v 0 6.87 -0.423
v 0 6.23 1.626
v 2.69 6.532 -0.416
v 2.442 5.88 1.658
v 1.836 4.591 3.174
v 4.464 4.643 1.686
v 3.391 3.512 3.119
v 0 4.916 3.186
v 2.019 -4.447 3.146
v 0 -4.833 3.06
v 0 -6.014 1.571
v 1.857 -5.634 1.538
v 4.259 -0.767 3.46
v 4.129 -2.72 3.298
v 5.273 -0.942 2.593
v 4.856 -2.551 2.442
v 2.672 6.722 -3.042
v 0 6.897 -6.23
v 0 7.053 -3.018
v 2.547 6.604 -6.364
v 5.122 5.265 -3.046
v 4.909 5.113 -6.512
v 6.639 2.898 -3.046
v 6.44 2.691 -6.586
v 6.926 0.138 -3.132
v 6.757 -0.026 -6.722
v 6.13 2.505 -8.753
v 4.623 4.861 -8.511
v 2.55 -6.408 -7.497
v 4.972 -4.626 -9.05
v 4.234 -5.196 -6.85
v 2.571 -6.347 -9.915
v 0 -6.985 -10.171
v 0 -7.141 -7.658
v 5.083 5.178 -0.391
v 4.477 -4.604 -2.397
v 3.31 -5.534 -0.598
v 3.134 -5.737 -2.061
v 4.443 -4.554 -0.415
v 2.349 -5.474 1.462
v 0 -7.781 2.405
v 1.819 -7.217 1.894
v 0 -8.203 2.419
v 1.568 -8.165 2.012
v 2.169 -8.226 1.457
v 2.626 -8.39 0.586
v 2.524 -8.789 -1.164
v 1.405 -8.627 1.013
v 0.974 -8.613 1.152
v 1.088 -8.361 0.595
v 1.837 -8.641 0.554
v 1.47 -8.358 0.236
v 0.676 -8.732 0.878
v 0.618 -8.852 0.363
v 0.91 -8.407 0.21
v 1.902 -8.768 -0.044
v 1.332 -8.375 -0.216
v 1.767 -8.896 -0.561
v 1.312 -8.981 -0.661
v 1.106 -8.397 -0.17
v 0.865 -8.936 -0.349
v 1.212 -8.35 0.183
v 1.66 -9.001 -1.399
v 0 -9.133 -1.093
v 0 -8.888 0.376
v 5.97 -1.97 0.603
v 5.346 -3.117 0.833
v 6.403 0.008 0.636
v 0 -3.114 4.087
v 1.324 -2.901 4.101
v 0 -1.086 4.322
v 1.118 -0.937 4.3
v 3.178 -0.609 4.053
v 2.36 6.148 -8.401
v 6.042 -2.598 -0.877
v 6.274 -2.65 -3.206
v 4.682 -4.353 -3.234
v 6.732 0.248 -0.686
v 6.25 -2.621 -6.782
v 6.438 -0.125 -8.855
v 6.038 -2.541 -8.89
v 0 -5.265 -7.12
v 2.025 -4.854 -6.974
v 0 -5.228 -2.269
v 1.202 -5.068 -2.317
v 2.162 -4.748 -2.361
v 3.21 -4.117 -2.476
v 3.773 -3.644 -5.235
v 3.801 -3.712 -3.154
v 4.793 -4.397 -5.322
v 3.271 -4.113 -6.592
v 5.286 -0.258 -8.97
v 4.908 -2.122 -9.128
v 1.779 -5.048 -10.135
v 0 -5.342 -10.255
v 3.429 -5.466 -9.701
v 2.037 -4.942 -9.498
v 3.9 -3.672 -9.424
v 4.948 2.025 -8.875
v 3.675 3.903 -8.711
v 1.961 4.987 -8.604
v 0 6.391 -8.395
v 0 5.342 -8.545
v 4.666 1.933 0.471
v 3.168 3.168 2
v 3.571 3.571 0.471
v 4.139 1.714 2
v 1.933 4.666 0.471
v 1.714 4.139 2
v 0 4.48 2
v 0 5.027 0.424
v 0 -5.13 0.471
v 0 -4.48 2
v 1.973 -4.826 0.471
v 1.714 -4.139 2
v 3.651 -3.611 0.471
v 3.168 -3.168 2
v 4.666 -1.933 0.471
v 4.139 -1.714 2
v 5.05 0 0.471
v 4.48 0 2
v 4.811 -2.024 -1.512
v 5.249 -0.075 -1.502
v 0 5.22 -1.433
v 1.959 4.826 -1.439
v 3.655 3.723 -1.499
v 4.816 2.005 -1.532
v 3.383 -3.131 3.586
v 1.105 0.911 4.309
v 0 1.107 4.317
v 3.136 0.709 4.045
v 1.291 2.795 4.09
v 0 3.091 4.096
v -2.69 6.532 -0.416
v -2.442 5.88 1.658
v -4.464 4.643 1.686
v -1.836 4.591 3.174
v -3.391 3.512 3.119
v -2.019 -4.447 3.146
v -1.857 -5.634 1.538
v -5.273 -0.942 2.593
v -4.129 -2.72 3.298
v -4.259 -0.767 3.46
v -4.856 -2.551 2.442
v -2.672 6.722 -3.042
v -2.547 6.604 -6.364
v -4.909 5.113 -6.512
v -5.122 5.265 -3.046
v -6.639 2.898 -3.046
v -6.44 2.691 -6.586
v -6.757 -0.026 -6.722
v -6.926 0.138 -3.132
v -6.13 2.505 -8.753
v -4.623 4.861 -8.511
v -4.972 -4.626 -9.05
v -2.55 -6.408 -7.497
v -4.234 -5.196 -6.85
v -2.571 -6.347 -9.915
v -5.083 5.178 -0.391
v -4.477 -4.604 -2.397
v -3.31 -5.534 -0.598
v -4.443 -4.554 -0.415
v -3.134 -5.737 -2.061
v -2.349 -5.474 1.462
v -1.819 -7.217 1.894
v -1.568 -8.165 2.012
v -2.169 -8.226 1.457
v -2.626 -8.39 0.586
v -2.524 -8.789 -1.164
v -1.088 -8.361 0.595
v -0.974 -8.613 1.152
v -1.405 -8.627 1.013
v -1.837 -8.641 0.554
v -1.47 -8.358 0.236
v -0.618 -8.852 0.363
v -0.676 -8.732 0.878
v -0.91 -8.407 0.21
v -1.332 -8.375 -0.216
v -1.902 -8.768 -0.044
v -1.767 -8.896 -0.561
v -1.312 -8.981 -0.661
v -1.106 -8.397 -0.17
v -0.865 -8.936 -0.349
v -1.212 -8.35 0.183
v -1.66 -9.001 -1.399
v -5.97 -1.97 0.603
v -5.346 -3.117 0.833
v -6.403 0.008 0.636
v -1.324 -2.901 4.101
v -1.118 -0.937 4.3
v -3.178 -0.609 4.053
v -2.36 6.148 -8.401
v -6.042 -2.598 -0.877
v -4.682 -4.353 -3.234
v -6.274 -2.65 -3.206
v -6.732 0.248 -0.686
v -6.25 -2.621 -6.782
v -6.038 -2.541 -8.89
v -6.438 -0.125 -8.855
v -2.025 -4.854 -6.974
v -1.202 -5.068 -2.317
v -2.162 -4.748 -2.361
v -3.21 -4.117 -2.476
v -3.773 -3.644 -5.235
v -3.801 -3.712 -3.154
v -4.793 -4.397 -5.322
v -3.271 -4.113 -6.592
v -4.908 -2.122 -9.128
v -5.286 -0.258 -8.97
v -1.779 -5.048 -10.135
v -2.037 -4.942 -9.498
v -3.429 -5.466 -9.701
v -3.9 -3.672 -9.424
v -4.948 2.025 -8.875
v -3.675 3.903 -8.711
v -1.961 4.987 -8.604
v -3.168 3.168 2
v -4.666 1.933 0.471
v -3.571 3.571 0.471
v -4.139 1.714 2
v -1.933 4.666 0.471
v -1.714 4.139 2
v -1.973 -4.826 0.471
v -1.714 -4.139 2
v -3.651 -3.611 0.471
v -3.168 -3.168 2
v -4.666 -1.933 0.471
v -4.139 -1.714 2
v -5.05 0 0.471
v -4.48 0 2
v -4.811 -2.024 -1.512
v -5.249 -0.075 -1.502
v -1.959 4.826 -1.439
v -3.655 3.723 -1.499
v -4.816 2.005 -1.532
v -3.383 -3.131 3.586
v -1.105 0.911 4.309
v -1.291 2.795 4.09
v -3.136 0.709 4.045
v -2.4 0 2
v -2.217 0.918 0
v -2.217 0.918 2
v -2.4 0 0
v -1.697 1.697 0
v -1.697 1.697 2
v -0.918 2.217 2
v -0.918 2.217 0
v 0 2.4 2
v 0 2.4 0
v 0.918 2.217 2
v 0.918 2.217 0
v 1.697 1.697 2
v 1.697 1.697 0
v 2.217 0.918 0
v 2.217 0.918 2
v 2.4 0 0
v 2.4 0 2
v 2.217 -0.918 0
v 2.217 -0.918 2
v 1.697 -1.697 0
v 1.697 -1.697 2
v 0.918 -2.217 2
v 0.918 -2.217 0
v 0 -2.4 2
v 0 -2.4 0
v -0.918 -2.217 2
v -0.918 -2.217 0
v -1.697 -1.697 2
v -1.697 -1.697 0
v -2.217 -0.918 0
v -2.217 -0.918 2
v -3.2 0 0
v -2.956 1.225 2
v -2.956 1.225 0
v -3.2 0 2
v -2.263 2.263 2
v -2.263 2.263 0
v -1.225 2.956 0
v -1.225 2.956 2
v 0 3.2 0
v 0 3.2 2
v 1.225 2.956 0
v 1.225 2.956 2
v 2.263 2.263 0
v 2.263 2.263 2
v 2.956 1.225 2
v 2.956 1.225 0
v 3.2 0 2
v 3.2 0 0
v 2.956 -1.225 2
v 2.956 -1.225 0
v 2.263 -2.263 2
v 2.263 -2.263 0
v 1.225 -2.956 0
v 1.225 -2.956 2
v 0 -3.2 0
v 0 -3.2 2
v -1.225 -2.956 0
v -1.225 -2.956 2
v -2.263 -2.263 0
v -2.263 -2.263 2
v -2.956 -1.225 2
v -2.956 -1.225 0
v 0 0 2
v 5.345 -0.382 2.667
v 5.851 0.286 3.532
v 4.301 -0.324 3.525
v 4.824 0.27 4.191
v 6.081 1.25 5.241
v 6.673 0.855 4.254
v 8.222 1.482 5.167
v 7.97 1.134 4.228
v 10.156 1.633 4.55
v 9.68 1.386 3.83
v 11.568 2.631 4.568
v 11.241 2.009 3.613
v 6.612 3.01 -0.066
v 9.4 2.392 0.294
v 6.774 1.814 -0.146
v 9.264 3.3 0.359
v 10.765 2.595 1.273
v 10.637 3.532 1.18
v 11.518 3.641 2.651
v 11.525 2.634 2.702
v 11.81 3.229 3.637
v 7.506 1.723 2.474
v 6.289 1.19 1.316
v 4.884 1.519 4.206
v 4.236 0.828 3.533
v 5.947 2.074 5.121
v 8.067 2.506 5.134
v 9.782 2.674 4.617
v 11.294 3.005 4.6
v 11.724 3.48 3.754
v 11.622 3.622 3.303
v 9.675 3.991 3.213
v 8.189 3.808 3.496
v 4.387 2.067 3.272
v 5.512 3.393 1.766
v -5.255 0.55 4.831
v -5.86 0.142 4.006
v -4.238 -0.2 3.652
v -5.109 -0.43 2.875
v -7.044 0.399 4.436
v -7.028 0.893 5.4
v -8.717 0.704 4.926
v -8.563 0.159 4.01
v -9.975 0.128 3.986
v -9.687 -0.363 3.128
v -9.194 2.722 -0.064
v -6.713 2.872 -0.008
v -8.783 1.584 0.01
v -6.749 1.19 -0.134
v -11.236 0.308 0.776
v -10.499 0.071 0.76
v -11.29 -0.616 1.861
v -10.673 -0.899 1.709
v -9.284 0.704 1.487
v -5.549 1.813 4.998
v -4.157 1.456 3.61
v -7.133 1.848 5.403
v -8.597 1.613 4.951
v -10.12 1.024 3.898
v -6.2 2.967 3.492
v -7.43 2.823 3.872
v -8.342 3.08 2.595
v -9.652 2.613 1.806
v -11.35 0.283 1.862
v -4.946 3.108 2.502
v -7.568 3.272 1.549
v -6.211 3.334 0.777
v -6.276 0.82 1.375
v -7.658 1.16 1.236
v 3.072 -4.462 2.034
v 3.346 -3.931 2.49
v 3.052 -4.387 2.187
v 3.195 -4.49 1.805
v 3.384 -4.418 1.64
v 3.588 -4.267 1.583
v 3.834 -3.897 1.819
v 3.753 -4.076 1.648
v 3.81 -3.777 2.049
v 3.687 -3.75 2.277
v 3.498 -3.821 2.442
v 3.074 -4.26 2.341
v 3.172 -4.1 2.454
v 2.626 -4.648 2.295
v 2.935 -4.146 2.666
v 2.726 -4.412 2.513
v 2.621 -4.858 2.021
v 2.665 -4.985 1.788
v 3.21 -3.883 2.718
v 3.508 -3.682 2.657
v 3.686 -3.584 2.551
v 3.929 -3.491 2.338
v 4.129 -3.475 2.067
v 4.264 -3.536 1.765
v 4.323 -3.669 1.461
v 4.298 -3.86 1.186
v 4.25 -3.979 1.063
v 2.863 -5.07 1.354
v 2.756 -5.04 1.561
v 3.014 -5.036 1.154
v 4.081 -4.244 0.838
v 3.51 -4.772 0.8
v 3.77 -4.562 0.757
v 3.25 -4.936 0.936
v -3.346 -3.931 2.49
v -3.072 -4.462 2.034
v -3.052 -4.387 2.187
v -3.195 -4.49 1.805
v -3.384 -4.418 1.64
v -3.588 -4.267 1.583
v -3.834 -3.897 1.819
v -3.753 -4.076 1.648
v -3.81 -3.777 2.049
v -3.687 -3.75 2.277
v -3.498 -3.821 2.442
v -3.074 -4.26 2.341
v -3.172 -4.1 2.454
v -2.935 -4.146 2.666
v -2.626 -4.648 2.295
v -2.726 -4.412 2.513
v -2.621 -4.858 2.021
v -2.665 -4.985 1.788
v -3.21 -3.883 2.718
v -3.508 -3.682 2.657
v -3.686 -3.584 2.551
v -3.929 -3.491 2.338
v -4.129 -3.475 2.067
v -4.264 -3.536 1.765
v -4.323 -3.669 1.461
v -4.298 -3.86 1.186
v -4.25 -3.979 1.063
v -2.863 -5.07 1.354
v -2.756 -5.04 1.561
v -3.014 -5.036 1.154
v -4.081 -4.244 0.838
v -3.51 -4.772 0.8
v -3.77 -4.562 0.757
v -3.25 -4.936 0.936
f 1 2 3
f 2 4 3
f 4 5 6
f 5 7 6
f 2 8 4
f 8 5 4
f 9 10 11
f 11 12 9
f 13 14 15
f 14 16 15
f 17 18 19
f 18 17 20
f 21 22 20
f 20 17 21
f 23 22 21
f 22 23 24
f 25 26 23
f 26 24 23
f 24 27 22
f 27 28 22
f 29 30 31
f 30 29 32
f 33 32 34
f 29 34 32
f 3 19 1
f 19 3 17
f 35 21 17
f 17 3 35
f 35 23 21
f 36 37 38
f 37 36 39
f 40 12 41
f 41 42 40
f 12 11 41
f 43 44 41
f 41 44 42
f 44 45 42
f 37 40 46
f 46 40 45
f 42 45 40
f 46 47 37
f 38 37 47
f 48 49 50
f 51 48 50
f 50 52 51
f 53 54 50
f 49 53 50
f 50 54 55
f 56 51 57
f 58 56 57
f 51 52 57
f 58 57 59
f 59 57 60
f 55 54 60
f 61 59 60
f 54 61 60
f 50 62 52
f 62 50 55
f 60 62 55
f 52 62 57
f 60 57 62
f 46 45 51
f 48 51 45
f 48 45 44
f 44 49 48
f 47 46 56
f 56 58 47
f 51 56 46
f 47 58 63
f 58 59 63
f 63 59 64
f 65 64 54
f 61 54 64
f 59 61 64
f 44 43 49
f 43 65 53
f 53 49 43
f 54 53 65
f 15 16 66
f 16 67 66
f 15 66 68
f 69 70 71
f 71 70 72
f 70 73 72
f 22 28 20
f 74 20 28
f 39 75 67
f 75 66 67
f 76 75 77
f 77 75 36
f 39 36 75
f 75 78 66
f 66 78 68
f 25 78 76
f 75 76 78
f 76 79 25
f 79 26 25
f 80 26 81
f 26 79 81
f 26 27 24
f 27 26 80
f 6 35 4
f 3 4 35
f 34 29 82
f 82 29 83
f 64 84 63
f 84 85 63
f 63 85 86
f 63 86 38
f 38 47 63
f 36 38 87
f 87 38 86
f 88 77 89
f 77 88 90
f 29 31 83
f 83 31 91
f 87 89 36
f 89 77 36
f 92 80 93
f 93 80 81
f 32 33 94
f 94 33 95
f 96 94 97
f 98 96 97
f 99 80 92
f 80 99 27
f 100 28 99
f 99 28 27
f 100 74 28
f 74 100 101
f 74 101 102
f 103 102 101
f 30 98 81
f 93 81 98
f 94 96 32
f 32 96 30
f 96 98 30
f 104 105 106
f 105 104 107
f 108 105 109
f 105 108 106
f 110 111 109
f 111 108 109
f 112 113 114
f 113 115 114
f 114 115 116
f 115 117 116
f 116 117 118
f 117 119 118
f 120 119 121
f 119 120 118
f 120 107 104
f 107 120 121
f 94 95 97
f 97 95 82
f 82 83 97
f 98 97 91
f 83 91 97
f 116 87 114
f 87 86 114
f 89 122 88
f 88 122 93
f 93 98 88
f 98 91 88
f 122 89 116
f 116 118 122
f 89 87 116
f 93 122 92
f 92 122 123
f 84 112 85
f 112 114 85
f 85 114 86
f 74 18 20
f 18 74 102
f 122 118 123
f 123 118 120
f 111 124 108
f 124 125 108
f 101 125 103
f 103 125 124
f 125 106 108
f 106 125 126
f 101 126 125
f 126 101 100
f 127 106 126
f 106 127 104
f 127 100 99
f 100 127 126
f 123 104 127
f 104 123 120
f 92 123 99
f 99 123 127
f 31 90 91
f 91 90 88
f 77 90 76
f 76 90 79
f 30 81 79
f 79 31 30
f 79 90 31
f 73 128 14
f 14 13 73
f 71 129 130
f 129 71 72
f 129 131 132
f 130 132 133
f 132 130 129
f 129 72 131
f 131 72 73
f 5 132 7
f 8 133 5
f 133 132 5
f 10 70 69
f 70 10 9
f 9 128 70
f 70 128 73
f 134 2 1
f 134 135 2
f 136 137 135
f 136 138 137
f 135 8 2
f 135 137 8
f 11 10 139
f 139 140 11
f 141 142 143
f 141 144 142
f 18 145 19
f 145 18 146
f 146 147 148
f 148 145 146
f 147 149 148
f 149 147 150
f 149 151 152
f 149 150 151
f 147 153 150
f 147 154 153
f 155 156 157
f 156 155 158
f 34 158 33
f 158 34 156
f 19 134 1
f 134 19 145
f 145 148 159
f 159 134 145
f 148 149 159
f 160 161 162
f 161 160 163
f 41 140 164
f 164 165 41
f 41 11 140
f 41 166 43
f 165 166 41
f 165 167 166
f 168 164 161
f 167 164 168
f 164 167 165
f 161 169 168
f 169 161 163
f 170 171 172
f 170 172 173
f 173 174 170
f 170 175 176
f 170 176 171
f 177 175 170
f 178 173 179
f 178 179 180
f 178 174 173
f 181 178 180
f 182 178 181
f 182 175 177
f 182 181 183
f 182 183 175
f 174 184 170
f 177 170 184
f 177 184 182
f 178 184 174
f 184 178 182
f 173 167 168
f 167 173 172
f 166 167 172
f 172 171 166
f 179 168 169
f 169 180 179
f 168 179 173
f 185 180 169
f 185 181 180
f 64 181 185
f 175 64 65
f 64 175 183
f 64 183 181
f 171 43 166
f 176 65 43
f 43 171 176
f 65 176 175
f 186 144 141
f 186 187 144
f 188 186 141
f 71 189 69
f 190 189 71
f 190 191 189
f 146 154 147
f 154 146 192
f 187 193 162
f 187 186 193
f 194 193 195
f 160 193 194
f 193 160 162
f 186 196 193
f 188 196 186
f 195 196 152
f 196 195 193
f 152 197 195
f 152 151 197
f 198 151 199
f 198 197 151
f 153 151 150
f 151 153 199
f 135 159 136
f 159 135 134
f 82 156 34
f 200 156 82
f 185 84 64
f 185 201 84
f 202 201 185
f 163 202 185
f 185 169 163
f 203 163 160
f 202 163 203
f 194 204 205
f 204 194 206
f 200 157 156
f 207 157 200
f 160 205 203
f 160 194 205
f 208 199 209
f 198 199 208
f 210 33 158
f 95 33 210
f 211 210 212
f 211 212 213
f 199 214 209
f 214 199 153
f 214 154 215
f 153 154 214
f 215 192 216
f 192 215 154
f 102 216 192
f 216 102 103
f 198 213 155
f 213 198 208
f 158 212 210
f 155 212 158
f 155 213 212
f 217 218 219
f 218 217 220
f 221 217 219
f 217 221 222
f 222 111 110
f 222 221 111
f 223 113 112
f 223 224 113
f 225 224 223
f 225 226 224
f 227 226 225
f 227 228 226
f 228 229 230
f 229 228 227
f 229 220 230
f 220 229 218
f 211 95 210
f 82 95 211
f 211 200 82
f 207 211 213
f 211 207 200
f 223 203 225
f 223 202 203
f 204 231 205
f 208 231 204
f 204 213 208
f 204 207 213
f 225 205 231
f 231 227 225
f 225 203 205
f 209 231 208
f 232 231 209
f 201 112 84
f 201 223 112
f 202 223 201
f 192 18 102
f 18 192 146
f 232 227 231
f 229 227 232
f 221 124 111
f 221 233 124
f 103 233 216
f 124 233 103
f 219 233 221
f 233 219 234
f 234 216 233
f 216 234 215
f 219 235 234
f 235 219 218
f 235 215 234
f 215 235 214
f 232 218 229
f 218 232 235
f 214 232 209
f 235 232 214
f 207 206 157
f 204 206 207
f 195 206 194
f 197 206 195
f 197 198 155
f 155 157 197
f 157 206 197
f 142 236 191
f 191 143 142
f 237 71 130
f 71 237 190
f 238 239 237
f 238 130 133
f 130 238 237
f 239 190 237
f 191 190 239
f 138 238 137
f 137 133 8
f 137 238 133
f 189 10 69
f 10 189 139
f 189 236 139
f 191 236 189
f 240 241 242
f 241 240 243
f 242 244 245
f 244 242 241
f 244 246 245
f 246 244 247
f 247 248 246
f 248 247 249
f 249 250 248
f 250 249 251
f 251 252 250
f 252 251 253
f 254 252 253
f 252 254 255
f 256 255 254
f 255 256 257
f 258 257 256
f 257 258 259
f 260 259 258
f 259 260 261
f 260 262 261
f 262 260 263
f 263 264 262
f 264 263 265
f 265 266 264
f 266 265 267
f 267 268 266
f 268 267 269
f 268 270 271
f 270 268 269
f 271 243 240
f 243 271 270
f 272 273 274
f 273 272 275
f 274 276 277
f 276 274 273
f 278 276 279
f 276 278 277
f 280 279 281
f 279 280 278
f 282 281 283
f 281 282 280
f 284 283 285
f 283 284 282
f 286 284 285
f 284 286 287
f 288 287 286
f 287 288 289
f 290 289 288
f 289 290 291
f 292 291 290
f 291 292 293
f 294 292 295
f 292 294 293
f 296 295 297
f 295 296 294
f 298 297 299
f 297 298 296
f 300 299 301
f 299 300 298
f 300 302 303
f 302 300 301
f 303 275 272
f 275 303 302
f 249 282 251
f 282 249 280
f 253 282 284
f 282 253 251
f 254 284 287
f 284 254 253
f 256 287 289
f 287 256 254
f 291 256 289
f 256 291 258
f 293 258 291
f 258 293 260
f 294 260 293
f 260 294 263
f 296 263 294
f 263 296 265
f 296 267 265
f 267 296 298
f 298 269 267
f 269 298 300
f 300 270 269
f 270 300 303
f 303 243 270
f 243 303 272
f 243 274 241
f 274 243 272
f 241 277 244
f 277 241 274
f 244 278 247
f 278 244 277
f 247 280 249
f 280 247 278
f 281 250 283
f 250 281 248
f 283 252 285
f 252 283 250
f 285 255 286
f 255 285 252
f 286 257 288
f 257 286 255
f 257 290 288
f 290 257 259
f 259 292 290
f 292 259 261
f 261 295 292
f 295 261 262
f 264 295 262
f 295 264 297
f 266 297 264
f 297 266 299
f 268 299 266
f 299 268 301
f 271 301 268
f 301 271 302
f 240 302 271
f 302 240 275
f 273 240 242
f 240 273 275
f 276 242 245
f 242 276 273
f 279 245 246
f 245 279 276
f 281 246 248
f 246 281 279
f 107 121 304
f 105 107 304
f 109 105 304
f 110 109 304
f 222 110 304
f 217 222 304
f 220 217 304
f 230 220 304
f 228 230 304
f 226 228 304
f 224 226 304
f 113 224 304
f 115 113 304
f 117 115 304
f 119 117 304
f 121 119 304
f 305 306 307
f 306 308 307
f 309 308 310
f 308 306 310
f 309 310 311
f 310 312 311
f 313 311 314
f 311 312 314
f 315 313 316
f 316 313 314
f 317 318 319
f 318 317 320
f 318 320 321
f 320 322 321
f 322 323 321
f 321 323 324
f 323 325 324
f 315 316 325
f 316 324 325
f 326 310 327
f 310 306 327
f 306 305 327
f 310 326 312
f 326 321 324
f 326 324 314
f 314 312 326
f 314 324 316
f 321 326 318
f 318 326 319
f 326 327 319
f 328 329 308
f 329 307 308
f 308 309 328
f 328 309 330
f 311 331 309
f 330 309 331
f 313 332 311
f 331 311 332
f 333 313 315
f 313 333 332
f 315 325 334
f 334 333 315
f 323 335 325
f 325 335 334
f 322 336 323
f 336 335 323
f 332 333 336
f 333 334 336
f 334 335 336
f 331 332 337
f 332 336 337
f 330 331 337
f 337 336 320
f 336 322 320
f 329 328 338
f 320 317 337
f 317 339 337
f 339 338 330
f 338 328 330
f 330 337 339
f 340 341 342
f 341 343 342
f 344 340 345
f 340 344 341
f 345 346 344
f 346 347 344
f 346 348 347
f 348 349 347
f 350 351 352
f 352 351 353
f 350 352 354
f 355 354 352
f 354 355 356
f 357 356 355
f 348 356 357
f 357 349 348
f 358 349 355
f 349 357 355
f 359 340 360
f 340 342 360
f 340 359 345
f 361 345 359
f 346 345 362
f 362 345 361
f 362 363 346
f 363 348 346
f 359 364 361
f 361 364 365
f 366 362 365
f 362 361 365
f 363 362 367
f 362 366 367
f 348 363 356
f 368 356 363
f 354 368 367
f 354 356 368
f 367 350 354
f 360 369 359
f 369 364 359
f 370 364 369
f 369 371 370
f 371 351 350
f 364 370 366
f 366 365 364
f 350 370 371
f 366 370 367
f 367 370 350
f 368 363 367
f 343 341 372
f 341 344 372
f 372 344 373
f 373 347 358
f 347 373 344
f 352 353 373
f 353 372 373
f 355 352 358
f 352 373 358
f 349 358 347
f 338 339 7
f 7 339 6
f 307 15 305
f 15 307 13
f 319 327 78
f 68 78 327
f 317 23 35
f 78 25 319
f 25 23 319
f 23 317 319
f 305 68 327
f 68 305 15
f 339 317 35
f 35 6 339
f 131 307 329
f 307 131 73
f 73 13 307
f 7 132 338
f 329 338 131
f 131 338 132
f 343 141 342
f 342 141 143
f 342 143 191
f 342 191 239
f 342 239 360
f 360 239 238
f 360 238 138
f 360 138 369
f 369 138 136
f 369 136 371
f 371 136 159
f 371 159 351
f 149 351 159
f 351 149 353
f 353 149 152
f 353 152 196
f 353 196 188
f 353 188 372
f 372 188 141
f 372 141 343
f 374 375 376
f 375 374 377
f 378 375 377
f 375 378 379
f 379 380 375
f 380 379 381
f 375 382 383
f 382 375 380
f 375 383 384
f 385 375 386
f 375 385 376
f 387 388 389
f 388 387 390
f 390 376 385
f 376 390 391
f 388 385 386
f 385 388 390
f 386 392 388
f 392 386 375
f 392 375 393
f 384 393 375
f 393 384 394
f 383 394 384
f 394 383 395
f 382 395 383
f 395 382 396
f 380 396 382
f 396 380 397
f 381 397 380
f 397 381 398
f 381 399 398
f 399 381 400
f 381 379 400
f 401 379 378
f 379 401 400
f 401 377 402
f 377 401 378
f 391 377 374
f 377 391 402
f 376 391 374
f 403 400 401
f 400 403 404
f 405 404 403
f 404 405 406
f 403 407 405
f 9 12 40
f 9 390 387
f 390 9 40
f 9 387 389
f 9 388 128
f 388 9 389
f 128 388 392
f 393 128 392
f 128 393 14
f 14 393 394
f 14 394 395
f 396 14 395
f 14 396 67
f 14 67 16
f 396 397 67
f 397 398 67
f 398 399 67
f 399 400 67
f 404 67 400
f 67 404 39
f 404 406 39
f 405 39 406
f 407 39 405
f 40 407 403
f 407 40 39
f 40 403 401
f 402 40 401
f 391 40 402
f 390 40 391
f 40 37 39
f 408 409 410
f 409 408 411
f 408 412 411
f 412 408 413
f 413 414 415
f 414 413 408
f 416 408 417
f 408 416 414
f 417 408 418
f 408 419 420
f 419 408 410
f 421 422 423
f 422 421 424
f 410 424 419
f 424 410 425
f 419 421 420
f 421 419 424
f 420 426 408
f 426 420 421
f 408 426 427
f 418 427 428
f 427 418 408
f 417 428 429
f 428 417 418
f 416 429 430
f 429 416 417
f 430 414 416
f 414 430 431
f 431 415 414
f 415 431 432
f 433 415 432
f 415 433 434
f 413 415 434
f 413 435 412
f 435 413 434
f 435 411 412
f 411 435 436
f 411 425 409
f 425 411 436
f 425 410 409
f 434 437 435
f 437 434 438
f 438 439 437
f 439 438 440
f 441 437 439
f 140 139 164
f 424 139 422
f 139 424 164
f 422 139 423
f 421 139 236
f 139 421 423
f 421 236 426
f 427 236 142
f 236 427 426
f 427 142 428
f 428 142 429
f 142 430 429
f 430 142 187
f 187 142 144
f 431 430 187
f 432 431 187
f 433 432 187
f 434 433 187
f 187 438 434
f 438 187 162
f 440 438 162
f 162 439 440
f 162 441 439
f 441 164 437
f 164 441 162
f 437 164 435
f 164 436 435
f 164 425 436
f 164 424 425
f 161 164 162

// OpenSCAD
use <../lib.scad>
use <s/17351s01.scad>
function ldraw_lib__17351p01() = [
// 0 Minifig Headdress Pig with Black Eyes Pattern
// 0 Name: 17351p01.dat
// 0 Author: Philippe Hurbain [Philo]
// 0 !LDRAW_ORG Part UPDATE 2020-02
// 0 !LICENSE Licensed under CC BY 4.0 : see CAreadme.txt
// 
// 0 BFC CERTIFY CCW
  [0,"BFC","CERTIFY"],
  [0,"BFC","CCW"],
// 
// 0 !CATEGORY Minifig Headwear
// 0 !KEYWORDS animal, BrickLink 17351pb01, Costume, Rebrickable 17351pr0001
// 0 !KEYWORDS Set 71007-14
// 
// 0 !HISTORY 2014-10-16 {LEGO Digital Designer} Original part shape
// 0 !HISTORY 2019-02-06 [Philo] File preparation for LDraw Parts Tracker
// 0 !HISTORY 2020-09-05 [PTadmin] Official Update 2020-02
// 
// 
// 1 16 0 0 0 1 0 0 0 1 0 0 0 1 s\17351s01.dat
  [1,16,0,0,0,1,0,0,0,1,0,0,0,1, ldraw_lib__s__17351s01()],
// 
// 0 // eyes
// 4 15 8.3656 -6.2259 -9.8284 7.629 -5.4665 -10.9675 7.6796 -5.0838 -11.1558 7.9867 -4.5131 -11.2245
  [4,15,8.3656,-6.2259,-9.8284,7.629,-5.4665,-10.9675,7.6796,-5.0838,-11.1558,7.9867,-4.5131,-11.2245],
// 4 15 8.3656 -6.2259 -9.8284 7.9867 -4.5131 -11.2245 8.4588 -4.1005 -11.0454 8.9694 -3.9566 -10.6665
  [4,15,8.3656,-6.2259,-9.8284,7.9867,-4.5131,-11.2245,8.4588,-4.1005,-11.0454,8.9694,-3.9566,-10.6665],
// 4 15 8.3656 -6.2259 -9.8284 8.9694 -3.9566 -10.6665 9.3817 -4.12 -10.1892 9.5852 -4.5469 -9.7415
  [4,15,8.3656,-6.2259,-9.8284,8.9694,-3.9566,-10.6665,9.3817,-4.12,-10.1892,9.5852,-4.5469,-9.7415],
// 4 15 8.3656 -6.2259 -9.8284 9.5852 -4.5469 -9.7415 9.5253 -5.1228 -9.4433 9.2182 -5.6936 -9.3745
  [4,15,8.3656,-6.2259,-9.8284,9.5852,-4.5469,-9.7415,9.5253,-5.1228,-9.4433,9.2182,-5.6936,-9.3745],
// 3 15 8.3656 -6.2259 -9.8284 9.2182 -5.6936 -9.3745 8.7461 -6.1061 -9.5536
  [3,15,8.3656,-6.2259,-9.8284,9.2182,-5.6936,-9.3745,8.7461,-6.1061,-9.5536],
// 4 15 7.6855 -5.8519 -10.6503 7.629 -5.4665 -10.9675 8.3656 -6.2259 -9.8284 7.931 -6.136 -10.2489
  [4,15,7.6855,-5.8519,-10.6503,7.629,-5.4665,-10.9675,8.3656,-6.2259,-9.8284,7.931,-6.136,-10.2489],
// 4 0 7.3371 -6.6651 -10.3654 6.8156 -6.2818 -11.0299 6.5647 -5.7375 -11.6201 6.552 -5.0521 -12.1442
  [4,0,7.3371,-6.6651,-10.3654,6.8156,-6.2818,-11.0299,6.5647,-5.7375,-11.6201,6.552,-5.0521,-12.1442],
// 4 0 6.552 -5.0521 -12.1442 6.6617 -4.4692 -12.4636 7.629 -5.4665 -10.9675 7.6855 -5.8519 -10.6503
  [4,0,6.552,-5.0521,-12.1442,6.6617,-4.4692,-12.4636,7.629,-5.4665,-10.9675,7.6855,-5.8519,-10.6503],
// 4 0 7.3371 -6.6651 -10.3654 6.552 -5.0521 -12.1442 7.6855 -5.8519 -10.6503 7.931 -6.136 -10.2489
  [4,0,7.3371,-6.6651,-10.3654,6.552,-5.0521,-12.1442,7.6855,-5.8519,-10.6503,7.931,-6.136,-10.2489],
// 4 0 8.0257 -6.794 -9.7086 7.3371 -6.6651 -10.3654 7.931 -6.136 -10.2489 8.3656 -6.2259 -9.8284
  [4,0,8.0257,-6.794,-9.7086,7.3371,-6.6651,-10.3654,7.931,-6.136,-10.2489,8.3656,-6.2259,-9.8284],
// 3 0 8.0257 -6.794 -9.7086 8.3656 -6.2259 -9.8284 8.7693 -6.6422 -9.2039
  [3,0,8.0257,-6.794,-9.7086,8.3656,-6.2259,-9.8284,8.7693,-6.6422,-9.2039],
// 4 0 8.7693 -6.6422 -9.2039 8.3656 -6.2259 -9.8284 8.7461 -6.1061 -9.5536 9.2138 -6.3777 -8.9593
  [4,0,8.7693,-6.6422,-9.2039,8.3656,-6.2259,-9.8284,8.7461,-6.1061,-9.5536,9.2138,-6.3777,-8.9593],
// 4 0 9.2138 -6.3777 -8.9593 8.7461 -6.1061 -9.5536 9.2182 -5.6936 -9.3745 9.8235 -5.8449 -8.728
  [4,0,9.2138,-6.3777,-8.9593,8.7461,-6.1061,-9.5536,9.2182,-5.6936,-9.3745,9.8235,-5.8449,-8.728],
// 4 0 9.8235 -5.8449 -8.728 9.2182 -5.6936 -9.3745 9.5253 -5.1228 -9.4433 10.3222 -5.1678 -8.6867
  [4,0,9.8235,-5.8449,-8.728,9.2182,-5.6936,-9.3745,9.5253,-5.1228,-9.4433,10.3222,-5.1678,-8.6867],
// 4 0 10.3222 -5.1678 -8.6867 9.5253 -5.1228 -9.4433 9.5852 -4.5469 -9.7415 10.661 -4.4127 -8.8395
  [4,0,10.3222,-5.1678,-8.6867,9.5253,-5.1228,-9.4433,9.5852,-4.5469,-9.7415,10.661,-4.4127,-8.8395],
// 4 0 10.8068 -3.6535 -9.1713 10.661 -4.4127 -8.8395 9.5852 -4.5469 -9.7415 9.3817 -4.12 -10.1892
  [4,0,10.8068,-3.6535,-9.1713,10.661,-4.4127,-8.8395,9.5852,-4.5469,-9.7415,9.3817,-4.12,-10.1892],
// 4 0 10.7453 -2.9646 -9.6498 10.8068 -3.6535 -9.1713 9.3817 -4.12 -10.1892 10.6249 -2.6574 -9.9482
  [4,0,10.7453,-2.9646,-9.6498,10.8068,-3.6535,-9.1713,9.3817,-4.12,-10.1892,10.6249,-2.6574,-9.9482],
// 3 0 9.3817 -4.12 -10.1892 8.9694 -3.9566 -10.6665 10.6249 -2.6574 -9.9482
  [3,0,9.3817,-4.12,-10.1892,8.9694,-3.9566,-10.6665,10.6249,-2.6574,-9.9482],
// 4 0 7.1567 -3.3854 -12.675 10.6249 -2.6574 -9.9482 8.9694 -3.9566 -10.6665 8.4588 -4.1005 -11.0454
  [4,0,7.1567,-3.3854,-12.675,10.6249,-2.6574,-9.9482,8.9694,-3.9566,-10.6665,8.4588,-4.1005,-11.0454],
// 4 0 6.8904 -3.9035 -12.601 7.1567 -3.3854 -12.675 8.4588 -4.1005 -11.0454 7.9867 -4.5131 -11.2245
  [4,0,6.8904,-3.9035,-12.601,7.1567,-3.3854,-12.675,8.4588,-4.1005,-11.0454,7.9867,-4.5131,-11.2245],
// 4 0 6.6617 -4.4692 -12.4636 6.8904 -3.9035 -12.601 7.9867 -4.5131 -11.2245 7.6796 -5.0838 -11.1558
  [4,0,6.6617,-4.4692,-12.4636,6.8904,-3.9035,-12.601,7.9867,-4.5131,-11.2245,7.6796,-5.0838,-11.1558],
// 3 0 7.629 -5.4665 -10.9675 6.6617 -4.4692 -12.4636 7.6796 -5.0838 -11.1558
  [3,0,7.629,-5.4665,-10.9675,6.6617,-4.4692,-12.4636,7.6796,-5.0838,-11.1558],
// 4 0 10.6249 -2.6574 -9.9482 7.1567 -3.3854 -12.675 7.5348 -2.8855 -12.5901 10.2013 -2.0946 -10.6105
  [4,0,10.6249,-2.6574,-9.9482,7.1567,-3.3854,-12.675,7.5348,-2.8855,-12.5901,10.2013,-2.0946,-10.6105],
// 4 0 9.4252 -1.8927 -11.4051 10.2013 -2.0946 -10.6105 7.5348 -2.8855 -12.5901 8.776 -1.9989 -11.9306
  [4,0,9.4252,-1.8927,-11.4051,10.2013,-2.0946,-10.6105,7.5348,-2.8855,-12.5901,8.776,-1.9989,-11.9306],
// 3 0 7.5348 -2.8855 -12.5901 8.1247 -2.341 -12.339 8.776 -1.9989 -11.9306
  [3,0,7.5348,-2.8855,-12.5901,8.1247,-2.341,-12.339,8.776,-1.9989,-11.9306],
// 3 16 5.048 -7.864 -11.117 4.643 -3.846 -14.085 5.872 -3.655 -13.685
  [3,16,5.048,-7.864,-11.117,4.643,-3.846,-14.085,5.872,-3.655,-13.685],
// 4 16 5.048 -7.864 -11.117 5.872 -3.655 -13.685 6.552 -5.0521 -12.1442 6.5647 -5.7375 -11.6201
  [4,16,5.048,-7.864,-11.117,5.872,-3.655,-13.685,6.552,-5.0521,-12.1442,6.5647,-5.7375,-11.6201],
// 3 16 5.048 -7.864 -11.117 6.5647 -5.7375 -11.6201 6.8156 -6.2818 -11.0299
  [3,16,5.048,-7.864,-11.117,6.5647,-5.7375,-11.6201,6.8156,-6.2818,-11.0299],
// 4 16 5.048 -7.864 -11.117 6.8156 -6.2818 -11.0299 7.3371 -6.6651 -10.3654 8.457 -8.966 -7.828
  [4,16,5.048,-7.864,-11.117,6.8156,-6.2818,-11.0299,7.3371,-6.6651,-10.3654,8.457,-8.966,-7.828],
// 3 16 8.457 -8.966 -7.828 7.3371 -6.6651 -10.3654 8.0257 -6.794 -9.7086
  [3,16,8.457,-8.966,-7.828,7.3371,-6.6651,-10.3654,8.0257,-6.794,-9.7086],
// 4 16 8.457 -8.966 -7.828 8.0257 -6.794 -9.7086 8.7693 -6.6422 -9.2039 10.323 -8.244 -6.801
  [4,16,8.457,-8.966,-7.828,8.0257,-6.794,-9.7086,8.7693,-6.6422,-9.2039,10.323,-8.244,-6.801],
// 3 16 10.323 -8.244 -6.801 8.7693 -6.6422 -9.2039 9.2138 -6.3777 -8.9593
  [3,16,10.323,-8.244,-6.801,8.7693,-6.6422,-9.2039,9.2138,-6.3777,-8.9593],
// 3 16 10.323 -8.244 -6.801 9.2138 -6.3777 -8.9593 9.8235 -5.8449 -8.728
  [3,16,10.323,-8.244,-6.801,9.2138,-6.3777,-8.9593,9.8235,-5.8449,-8.728],
// 4 16 10.323 -8.244 -6.801 9.8235 -5.8449 -8.728 10.3222 -5.1678 -8.6867 13.366 -2.082 -7.793
  [4,16,10.323,-8.244,-6.801,9.8235,-5.8449,-8.728,10.3222,-5.1678,-8.6867,13.366,-2.082,-7.793],
// 3 16 10.323 -8.244 -6.801 13.366 -2.082 -7.793 12.141 -6.105 -6.378
  [3,16,10.323,-8.244,-6.801,13.366,-2.082,-7.793,12.141,-6.105,-6.378],
// 3 16 10.3222 -5.1678 -8.6867 10.661 -4.4127 -8.8395 13.366 -2.082 -7.793
  [3,16,10.3222,-5.1678,-8.6867,10.661,-4.4127,-8.8395,13.366,-2.082,-7.793],
// 3 16 10.661 -4.4127 -8.8395 10.8068 -3.6535 -9.1713 13.366 -2.082 -7.793
  [3,16,10.661,-4.4127,-8.8395,10.8068,-3.6535,-9.1713,13.366,-2.082,-7.793],
// 3 16 10.8068 -3.6535 -9.1713 10.7453 -2.9646 -9.6498 13.366 -2.082 -7.793
  [3,16,10.8068,-3.6535,-9.1713,10.7453,-2.9646,-9.6498,13.366,-2.082,-7.793],
// 3 16 10.7453 -2.9646 -9.6498 10.6249 -2.6574 -9.9482 13.366 -2.082 -7.793
  [3,16,10.7453,-2.9646,-9.6498,10.6249,-2.6574,-9.9482,13.366,-2.082,-7.793],
// 4 16 11.108 1.037 -11.384 13.366 -2.082 -7.793 10.6249 -2.6574 -9.9482 10.2013 -2.0946 -10.6105
  [4,16,11.108,1.037,-11.384,13.366,-2.082,-7.793,10.6249,-2.6574,-9.9482,10.2013,-2.0946,-10.6105],
// 3 16 10.2013 -2.0946 -10.6105 9.4252 -1.8927 -11.4051 11.108 1.037 -11.384
  [3,16,10.2013,-2.0946,-10.6105,9.4252,-1.8927,-11.4051,11.108,1.037,-11.384],
// 3 16 8.776 -1.9989 -11.9306 11.108 1.037 -11.384 9.4252 -1.8927 -11.4051
  [3,16,8.776,-1.9989,-11.9306,11.108,1.037,-11.384,9.4252,-1.8927,-11.4051],
// 3 16 8.1247 -2.341 -12.339 11.108 1.037 -11.384 8.776 -1.9989 -11.9306
  [3,16,8.1247,-2.341,-12.339,11.108,1.037,-11.384,8.776,-1.9989,-11.9306],
// 4 16 5.872 -3.655 -13.685 11.108 1.037 -11.384 8.1247 -2.341 -12.339 7.5348 -2.8855 -12.5901
  [4,16,5.872,-3.655,-13.685,11.108,1.037,-11.384,8.1247,-2.341,-12.339,7.5348,-2.8855,-12.5901],
// 3 16 5.872 -3.655 -13.685 7.5348 -2.8855 -12.5901 7.1567 -3.3854 -12.675
  [3,16,5.872,-3.655,-13.685,7.5348,-2.8855,-12.5901,7.1567,-3.3854,-12.675],
// 3 16 6.8904 -3.9035 -12.601 5.872 -3.655 -13.685 7.1567 -3.3854 -12.675
  [3,16,6.8904,-3.9035,-12.601,5.872,-3.655,-13.685,7.1567,-3.3854,-12.675],
// 3 16 6.6617 -4.4692 -12.4636 5.872 -3.655 -13.685 6.8904 -3.9035 -12.601
  [3,16,6.6617,-4.4692,-12.4636,5.872,-3.655,-13.685,6.8904,-3.9035,-12.601],
// 3 16 6.552 -5.0521 -12.1442 5.872 -3.655 -13.685 6.6617 -4.4692 -12.4636
  [3,16,6.552,-5.0521,-12.1442,5.872,-3.655,-13.685,6.6617,-4.4692,-12.4636],
// 3 16 5.872 -3.655 -13.685 8.274 1.496 -13.836 11.108 1.037 -11.384
  [3,16,5.872,-3.655,-13.685,8.274,1.496,-13.836,11.108,1.037,-11.384],
// 
// 5 24 5.872 -3.655 -13.685 5.048 -7.864 -11.117 4.643 -3.846 -14.085 8.457 -8.966 -7.828
  [5,24,5.872,-3.655,-13.685,5.048,-7.864,-11.117,4.643,-3.846,-14.085,8.457,-8.966,-7.828],
// 5 24 5.872 -3.655 -13.685 11.108 1.037 -11.384 8.274 1.496 -13.836 13.366 -2.082 -7.793
  [5,24,5.872,-3.655,-13.685,11.108,1.037,-11.384,8.274,1.496,-13.836,13.366,-2.082,-7.793],
// 5 24 13.366 -2.082 -7.793 5.872 -3.655 -13.685 11.108 1.037 -11.384 10.323 -8.244 -6.801
  [5,24,13.366,-2.082,-7.793,5.872,-3.655,-13.685,11.108,1.037,-11.384,10.323,-8.244,-6.801],
// 5 24 13.366 -2.082 -7.793 10.323 -8.244 -6.801 5.872 -3.655 -13.685 12.141 -6.105 -6.378
  [5,24,13.366,-2.082,-7.793,10.323,-8.244,-6.801,5.872,-3.655,-13.685,12.141,-6.105,-6.378],
// 5 24 10.323 -8.244 -6.801 5.872 -3.655 -13.685 13.366 -2.082 -7.793 8.457 -8.966 -7.828
  [5,24,10.323,-8.244,-6.801,5.872,-3.655,-13.685,13.366,-2.082,-7.793,8.457,-8.966,-7.828],
// 5 24 5.872 -3.655 -13.685 8.457 -8.966 -7.828 5.048 -7.864 -11.117 10.323 -8.244 -6.801
  [5,24,5.872,-3.655,-13.685,8.457,-8.966,-7.828,5.048,-7.864,-11.117,10.323,-8.244,-6.801],
// 
// 4 15 -7.6796 -5.0838 -11.1558 -7.629 -5.4665 -10.9675 -8.3656 -6.2259 -9.8284 -7.9867 -4.5131 -11.2245
  [4,15,-7.6796,-5.0838,-11.1558,-7.629,-5.4665,-10.9675,-8.3656,-6.2259,-9.8284,-7.9867,-4.5131,-11.2245],
// 4 15 -8.4588 -4.1005 -11.0454 -7.9867 -4.5131 -11.2245 -8.3656 -6.2259 -9.8284 -8.9694 -3.9566 -10.6665
  [4,15,-8.4588,-4.1005,-11.0454,-7.9867,-4.5131,-11.2245,-8.3656,-6.2259,-9.8284,-8.9694,-3.9566,-10.6665],
// 4 15 -9.3817 -4.12 -10.1892 -8.9694 -3.9566 -10.6665 -8.3656 -6.2259 -9.8284 -9.5852 -4.5469 -9.7415
  [4,15,-9.3817,-4.12,-10.1892,-8.9694,-3.9566,-10.6665,-8.3656,-6.2259,-9.8284,-9.5852,-4.5469,-9.7415],
// 4 15 -9.5253 -5.1228 -9.4433 -9.5852 -4.5469 -9.7415 -8.3656 -6.2259 -9.8284 -9.2182 -5.6936 -9.3745
  [4,15,-9.5253,-5.1228,-9.4433,-9.5852,-4.5469,-9.7415,-8.3656,-6.2259,-9.8284,-9.2182,-5.6936,-9.3745],
// 3 15 -9.2182 -5.6936 -9.3745 -8.3656 -6.2259 -9.8284 -8.7461 -6.1061 -9.5536
  [3,15,-9.2182,-5.6936,-9.3745,-8.3656,-6.2259,-9.8284,-8.7461,-6.1061,-9.5536],
// 4 15 -8.3656 -6.2259 -9.8284 -7.629 -5.4665 -10.9675 -7.6855 -5.8519 -10.6503 -7.931 -6.136 -10.2489
  [4,15,-8.3656,-6.2259,-9.8284,-7.629,-5.4665,-10.9675,-7.6855,-5.8519,-10.6503,-7.931,-6.136,-10.2489],
// 4 0 -6.5647 -5.7375 -11.6201 -6.8156 -6.2818 -11.0299 -7.3371 -6.6651 -10.3654 -6.552 -5.0521 -12.1442
  [4,0,-6.5647,-5.7375,-11.6201,-6.8156,-6.2818,-11.0299,-7.3371,-6.6651,-10.3654,-6.552,-5.0521,-12.1442],
// 4 0 -7.629 -5.4665 -10.9675 -6.6617 -4.4692 -12.4636 -6.552 -5.0521 -12.1442 -7.6855 -5.8519 -10.6503
  [4,0,-7.629,-5.4665,-10.9675,-6.6617,-4.4692,-12.4636,-6.552,-5.0521,-12.1442,-7.6855,-5.8519,-10.6503],
// 4 0 -7.6855 -5.8519 -10.6503 -6.552 -5.0521 -12.1442 -7.3371 -6.6651 -10.3654 -7.931 -6.136 -10.2489
  [4,0,-7.6855,-5.8519,-10.6503,-6.552,-5.0521,-12.1442,-7.3371,-6.6651,-10.3654,-7.931,-6.136,-10.2489],
// 4 0 -7.931 -6.136 -10.2489 -7.3371 -6.6651 -10.3654 -8.0257 -6.794 -9.7086 -8.3656 -6.2259 -9.8284
  [4,0,-7.931,-6.136,-10.2489,-7.3371,-6.6651,-10.3654,-8.0257,-6.794,-9.7086,-8.3656,-6.2259,-9.8284],
// 3 0 -8.3656 -6.2259 -9.8284 -8.0257 -6.794 -9.7086 -8.7693 -6.6422 -9.2039
  [3,0,-8.3656,-6.2259,-9.8284,-8.0257,-6.794,-9.7086,-8.7693,-6.6422,-9.2039],
// 4 0 -8.7461 -6.1061 -9.5536 -8.3656 -6.2259 -9.8284 -8.7693 -6.6422 -9.2039 -9.2138 -6.3777 -8.9593
  [4,0,-8.7461,-6.1061,-9.5536,-8.3656,-6.2259,-9.8284,-8.7693,-6.6422,-9.2039,-9.2138,-6.3777,-8.9593],
// 4 0 -9.2182 -5.6936 -9.3745 -8.7461 -6.1061 -9.5536 -9.2138 -6.3777 -8.9593 -9.8235 -5.8449 -8.728
  [4,0,-9.2182,-5.6936,-9.3745,-8.7461,-6.1061,-9.5536,-9.2138,-6.3777,-8.9593,-9.8235,-5.8449,-8.728],
// 4 0 -9.5253 -5.1228 -9.4433 -9.2182 -5.6936 -9.3745 -9.8235 -5.8449 -8.728 -10.3222 -5.1678 -8.6867
  [4,0,-9.5253,-5.1228,-9.4433,-9.2182,-5.6936,-9.3745,-9.8235,-5.8449,-8.728,-10.3222,-5.1678,-8.6867],
// 4 0 -9.5852 -4.5469 -9.7415 -9.5253 -5.1228 -9.4433 -10.3222 -5.1678 -8.6867 -10.661 -4.4127 -8.8395
  [4,0,-9.5852,-4.5469,-9.7415,-9.5253,-5.1228,-9.4433,-10.3222,-5.1678,-8.6867,-10.661,-4.4127,-8.8395],
// 4 0 -9.5852 -4.5469 -9.7415 -10.661 -4.4127 -8.8395 -10.8068 -3.6535 -9.1713 -9.3817 -4.12 -10.1892
  [4,0,-9.5852,-4.5469,-9.7415,-10.661,-4.4127,-8.8395,-10.8068,-3.6535,-9.1713,-9.3817,-4.12,-10.1892],
// 4 0 -9.3817 -4.12 -10.1892 -10.8068 -3.6535 -9.1713 -10.7453 -2.9646 -9.6498 -10.6249 -2.6574 -9.9482
  [4,0,-9.3817,-4.12,-10.1892,-10.8068,-3.6535,-9.1713,-10.7453,-2.9646,-9.6498,-10.6249,-2.6574,-9.9482],
// 3 0 -8.9694 -3.9566 -10.6665 -9.3817 -4.12 -10.1892 -10.6249 -2.6574 -9.9482
  [3,0,-8.9694,-3.9566,-10.6665,-9.3817,-4.12,-10.1892,-10.6249,-2.6574,-9.9482],
// 4 0 -8.9694 -3.9566 -10.6665 -10.6249 -2.6574 -9.9482 -7.1567 -3.3854 -12.675 -8.4588 -4.1005 -11.0454
  [4,0,-8.9694,-3.9566,-10.6665,-10.6249,-2.6574,-9.9482,-7.1567,-3.3854,-12.675,-8.4588,-4.1005,-11.0454],
// 4 0 -8.4588 -4.1005 -11.0454 -7.1567 -3.3854 -12.675 -6.8904 -3.9035 -12.601 -7.9867 -4.5131 -11.2245
  [4,0,-8.4588,-4.1005,-11.0454,-7.1567,-3.3854,-12.675,-6.8904,-3.9035,-12.601,-7.9867,-4.5131,-11.2245],
// 4 0 -7.9867 -4.5131 -11.2245 -6.8904 -3.9035 -12.601 -6.6617 -4.4692 -12.4636 -7.6796 -5.0838 -11.1558
  [4,0,-7.9867,-4.5131,-11.2245,-6.8904,-3.9035,-12.601,-6.6617,-4.4692,-12.4636,-7.6796,-5.0838,-11.1558],
// 3 0 -6.6617 -4.4692 -12.4636 -7.629 -5.4665 -10.9675 -7.6796 -5.0838 -11.1558
  [3,0,-6.6617,-4.4692,-12.4636,-7.629,-5.4665,-10.9675,-7.6796,-5.0838,-11.1558],
// 4 0 -7.5348 -2.8855 -12.5901 -7.1567 -3.3854 -12.675 -10.6249 -2.6574 -9.9482 -10.2013 -2.0946 -10.6105
  [4,0,-7.5348,-2.8855,-12.5901,-7.1567,-3.3854,-12.675,-10.6249,-2.6574,-9.9482,-10.2013,-2.0946,-10.6105],
// 4 0 -7.5348 -2.8855 -12.5901 -10.2013 -2.0946 -10.6105 -9.4252 -1.8927 -11.4051 -8.776 -1.9989 -11.9306
  [4,0,-7.5348,-2.8855,-12.5901,-10.2013,-2.0946,-10.6105,-9.4252,-1.8927,-11.4051,-8.776,-1.9989,-11.9306],
// 3 0 -8.1247 -2.341 -12.339 -7.5348 -2.8855 -12.5901 -8.776 -1.9989 -11.9306
  [3,0,-8.1247,-2.341,-12.339,-7.5348,-2.8855,-12.5901,-8.776,-1.9989,-11.9306],
// 3 16 -4.643 -3.846 -14.085 -5.048 -7.864 -11.117 -5.872 -3.655 -13.685
  [3,16,-4.643,-3.846,-14.085,-5.048,-7.864,-11.117,-5.872,-3.655,-13.685],
// 4 16 -6.552 -5.0521 -12.1442 -5.872 -3.655 -13.685 -5.048 -7.864 -11.117 -6.5647 -5.7375 -11.6201
  [4,16,-6.552,-5.0521,-12.1442,-5.872,-3.655,-13.685,-5.048,-7.864,-11.117,-6.5647,-5.7375,-11.6201],
// 3 16 -6.5647 -5.7375 -11.6201 -5.048 -7.864 -11.117 -6.8156 -6.2818 -11.0299
  [3,16,-6.5647,-5.7375,-11.6201,-5.048,-7.864,-11.117,-6.8156,-6.2818,-11.0299],
// 4 16 -7.3371 -6.6651 -10.3654 -6.8156 -6.2818 -11.0299 -5.048 -7.864 -11.117 -8.457 -8.966 -7.828
  [4,16,-7.3371,-6.6651,-10.3654,-6.8156,-6.2818,-11.0299,-5.048,-7.864,-11.117,-8.457,-8.966,-7.828],
// 3 16 -7.3371 -6.6651 -10.3654 -8.457 -8.966 -7.828 -8.0257 -6.794 -9.7086
  [3,16,-7.3371,-6.6651,-10.3654,-8.457,-8.966,-7.828,-8.0257,-6.794,-9.7086],
// 4 16 -8.7693 -6.6422 -9.2039 -8.0257 -6.794 -9.7086 -8.457 -8.966 -7.828 -10.323 -8.244 -6.801
  [4,16,-8.7693,-6.6422,-9.2039,-8.0257,-6.794,-9.7086,-8.457,-8.966,-7.828,-10.323,-8.244,-6.801],
// 3 16 -8.7693 -6.6422 -9.2039 -10.323 -8.244 -6.801 -9.2138 -6.3777 -8.9593
  [3,16,-8.7693,-6.6422,-9.2039,-10.323,-8.244,-6.801,-9.2138,-6.3777,-8.9593],
// 3 16 -9.2138 -6.3777 -8.9593 -10.323 -8.244 -6.801 -9.8235 -5.8449 -8.728
  [3,16,-9.2138,-6.3777,-8.9593,-10.323,-8.244,-6.801,-9.8235,-5.8449,-8.728],
// 4 16 -10.3222 -5.1678 -8.6867 -9.8235 -5.8449 -8.728 -10.323 -8.244 -6.801 -13.366 -2.082 -7.793
  [4,16,-10.3222,-5.1678,-8.6867,-9.8235,-5.8449,-8.728,-10.323,-8.244,-6.801,-13.366,-2.082,-7.793],
// 3 16 -13.366 -2.082 -7.793 -10.323 -8.244 -6.801 -12.141 -6.105 -6.378
  [3,16,-13.366,-2.082,-7.793,-10.323,-8.244,-6.801,-12.141,-6.105,-6.378],
// 3 16 -10.661 -4.4127 -8.8395 -10.3222 -5.1678 -8.6867 -13.366 -2.082 -7.793
  [3,16,-10.661,-4.4127,-8.8395,-10.3222,-5.1678,-8.6867,-13.366,-2.082,-7.793],
// 3 16 -10.8068 -3.6535 -9.1713 -10.661 -4.4127 -8.8395 -13.366 -2.082 -7.793
  [3,16,-10.8068,-3.6535,-9.1713,-10.661,-4.4127,-8.8395,-13.366,-2.082,-7.793],
// 3 16 -10.7453 -2.9646 -9.6498 -10.8068 -3.6535 -9.1713 -13.366 -2.082 -7.793
  [3,16,-10.7453,-2.9646,-9.6498,-10.8068,-3.6535,-9.1713,-13.366,-2.082,-7.793],
// 3 16 -10.6249 -2.6574 -9.9482 -10.7453 -2.9646 -9.6498 -13.366 -2.082 -7.793
  [3,16,-10.6249,-2.6574,-9.9482,-10.7453,-2.9646,-9.6498,-13.366,-2.082,-7.793],
// 4 16 -10.6249 -2.6574 -9.9482 -13.366 -2.082 -7.793 -11.108 1.037 -11.384 -10.2013 -2.0946 -10.6105
  [4,16,-10.6249,-2.6574,-9.9482,-13.366,-2.082,-7.793,-11.108,1.037,-11.384,-10.2013,-2.0946,-10.6105],
// 3 16 -9.4252 -1.8927 -11.4051 -10.2013 -2.0946 -10.6105 -11.108 1.037 -11.384
  [3,16,-9.4252,-1.8927,-11.4051,-10.2013,-2.0946,-10.6105,-11.108,1.037,-11.384],
// 3 16 -11.108 1.037 -11.384 -8.776 -1.9989 -11.9306 -9.4252 -1.8927 -11.4051
  [3,16,-11.108,1.037,-11.384,-8.776,-1.9989,-11.9306,-9.4252,-1.8927,-11.4051],
// 3 16 -11.108 1.037 -11.384 -8.1247 -2.341 -12.339 -8.776 -1.9989 -11.9306
  [3,16,-11.108,1.037,-11.384,-8.1247,-2.341,-12.339,-8.776,-1.9989,-11.9306],
// 4 16 -8.1247 -2.341 -12.339 -11.108 1.037 -11.384 -5.872 -3.655 -13.685 -7.5348 -2.8855 -12.5901
  [4,16,-8.1247,-2.341,-12.339,-11.108,1.037,-11.384,-5.872,-3.655,-13.685,-7.5348,-2.8855,-12.5901],
// 3 16 -7.5348 -2.8855 -12.5901 -5.872 -3.655 -13.685 -7.1567 -3.3854 -12.675
  [3,16,-7.5348,-2.8855,-12.5901,-5.872,-3.655,-13.685,-7.1567,-3.3854,-12.675],
// 3 16 -5.872 -3.655 -13.685 -6.8904 -3.9035 -12.601 -7.1567 -3.3854 -12.675
  [3,16,-5.872,-3.655,-13.685,-6.8904,-3.9035,-12.601,-7.1567,-3.3854,-12.675],
// 3 16 -5.872 -3.655 -13.685 -6.6617 -4.4692 -12.4636 -6.8904 -3.9035 -12.601
  [3,16,-5.872,-3.655,-13.685,-6.6617,-4.4692,-12.4636,-6.8904,-3.9035,-12.601],
// 3 16 -5.872 -3.655 -13.685 -6.552 -5.0521 -12.1442 -6.6617 -4.4692 -12.4636
  [3,16,-5.872,-3.655,-13.685,-6.552,-5.0521,-12.1442,-6.6617,-4.4692,-12.4636],
// 3 16 -8.274 1.496 -13.836 -5.872 -3.655 -13.685 -11.108 1.037 -11.384
  [3,16,-8.274,1.496,-13.836,-5.872,-3.655,-13.685,-11.108,1.037,-11.384],
// 
// 5 24 -5.872 -3.655 -13.685 -5.048 -7.864 -11.117 -8.457 -8.966 -7.828 -4.643 -3.846 -14.085
  [5,24,-5.872,-3.655,-13.685,-5.048,-7.864,-11.117,-8.457,-8.966,-7.828,-4.643,-3.846,-14.085],
// 5 24 -13.366 -2.082 -7.793 -5.872 -3.655 -13.685 -10.323 -8.244 -6.801 -11.108 1.037 -11.384
  [5,24,-13.366,-2.082,-7.793,-5.872,-3.655,-13.685,-10.323,-8.244,-6.801,-11.108,1.037,-11.384],
// 5 24 -5.872 -3.655 -13.685 -10.323 -8.244 -6.801 -13.366 -2.082 -7.793 -8.457 -8.966 -7.828
  [5,24,-5.872,-3.655,-13.685,-10.323,-8.244,-6.801,-13.366,-2.082,-7.793,-8.457,-8.966,-7.828],
// 5 24 -10.323 -8.244 -6.801 -13.366 -2.082 -7.793 -5.872 -3.655 -13.685 -12.141 -6.105 -6.378
  [5,24,-10.323,-8.244,-6.801,-13.366,-2.082,-7.793,-5.872,-3.655,-13.685,-12.141,-6.105,-6.378],
// 5 24 -8.457 -8.966 -7.828 -5.872 -3.655 -13.685 -5.048 -7.864 -11.117 -10.323 -8.244 -6.801
  [5,24,-8.457,-8.966,-7.828,-5.872,-3.655,-13.685,-5.048,-7.864,-11.117,-10.323,-8.244,-6.801],
// 5 24 -11.108 1.037 -11.384 -5.872 -3.655 -13.685 -13.366 -2.082 -7.793 -8.274 1.496 -13.836
  [5,24,-11.108,1.037,-11.384,-5.872,-3.655,-13.685,-13.366,-2.082,-7.793,-8.274,1.496,-13.836],
];
module ldraw_lib__17351p01(step=0, col=false, unit=2/5, alt=false, line=0.2, solid=!$preview)
    makepoly(ldraw_lib__17351p01(), step=step, col=col, unit=unit, alt=alt, line=line, solid=solid);
ldraw_lib__17351p01(line=0.2);
